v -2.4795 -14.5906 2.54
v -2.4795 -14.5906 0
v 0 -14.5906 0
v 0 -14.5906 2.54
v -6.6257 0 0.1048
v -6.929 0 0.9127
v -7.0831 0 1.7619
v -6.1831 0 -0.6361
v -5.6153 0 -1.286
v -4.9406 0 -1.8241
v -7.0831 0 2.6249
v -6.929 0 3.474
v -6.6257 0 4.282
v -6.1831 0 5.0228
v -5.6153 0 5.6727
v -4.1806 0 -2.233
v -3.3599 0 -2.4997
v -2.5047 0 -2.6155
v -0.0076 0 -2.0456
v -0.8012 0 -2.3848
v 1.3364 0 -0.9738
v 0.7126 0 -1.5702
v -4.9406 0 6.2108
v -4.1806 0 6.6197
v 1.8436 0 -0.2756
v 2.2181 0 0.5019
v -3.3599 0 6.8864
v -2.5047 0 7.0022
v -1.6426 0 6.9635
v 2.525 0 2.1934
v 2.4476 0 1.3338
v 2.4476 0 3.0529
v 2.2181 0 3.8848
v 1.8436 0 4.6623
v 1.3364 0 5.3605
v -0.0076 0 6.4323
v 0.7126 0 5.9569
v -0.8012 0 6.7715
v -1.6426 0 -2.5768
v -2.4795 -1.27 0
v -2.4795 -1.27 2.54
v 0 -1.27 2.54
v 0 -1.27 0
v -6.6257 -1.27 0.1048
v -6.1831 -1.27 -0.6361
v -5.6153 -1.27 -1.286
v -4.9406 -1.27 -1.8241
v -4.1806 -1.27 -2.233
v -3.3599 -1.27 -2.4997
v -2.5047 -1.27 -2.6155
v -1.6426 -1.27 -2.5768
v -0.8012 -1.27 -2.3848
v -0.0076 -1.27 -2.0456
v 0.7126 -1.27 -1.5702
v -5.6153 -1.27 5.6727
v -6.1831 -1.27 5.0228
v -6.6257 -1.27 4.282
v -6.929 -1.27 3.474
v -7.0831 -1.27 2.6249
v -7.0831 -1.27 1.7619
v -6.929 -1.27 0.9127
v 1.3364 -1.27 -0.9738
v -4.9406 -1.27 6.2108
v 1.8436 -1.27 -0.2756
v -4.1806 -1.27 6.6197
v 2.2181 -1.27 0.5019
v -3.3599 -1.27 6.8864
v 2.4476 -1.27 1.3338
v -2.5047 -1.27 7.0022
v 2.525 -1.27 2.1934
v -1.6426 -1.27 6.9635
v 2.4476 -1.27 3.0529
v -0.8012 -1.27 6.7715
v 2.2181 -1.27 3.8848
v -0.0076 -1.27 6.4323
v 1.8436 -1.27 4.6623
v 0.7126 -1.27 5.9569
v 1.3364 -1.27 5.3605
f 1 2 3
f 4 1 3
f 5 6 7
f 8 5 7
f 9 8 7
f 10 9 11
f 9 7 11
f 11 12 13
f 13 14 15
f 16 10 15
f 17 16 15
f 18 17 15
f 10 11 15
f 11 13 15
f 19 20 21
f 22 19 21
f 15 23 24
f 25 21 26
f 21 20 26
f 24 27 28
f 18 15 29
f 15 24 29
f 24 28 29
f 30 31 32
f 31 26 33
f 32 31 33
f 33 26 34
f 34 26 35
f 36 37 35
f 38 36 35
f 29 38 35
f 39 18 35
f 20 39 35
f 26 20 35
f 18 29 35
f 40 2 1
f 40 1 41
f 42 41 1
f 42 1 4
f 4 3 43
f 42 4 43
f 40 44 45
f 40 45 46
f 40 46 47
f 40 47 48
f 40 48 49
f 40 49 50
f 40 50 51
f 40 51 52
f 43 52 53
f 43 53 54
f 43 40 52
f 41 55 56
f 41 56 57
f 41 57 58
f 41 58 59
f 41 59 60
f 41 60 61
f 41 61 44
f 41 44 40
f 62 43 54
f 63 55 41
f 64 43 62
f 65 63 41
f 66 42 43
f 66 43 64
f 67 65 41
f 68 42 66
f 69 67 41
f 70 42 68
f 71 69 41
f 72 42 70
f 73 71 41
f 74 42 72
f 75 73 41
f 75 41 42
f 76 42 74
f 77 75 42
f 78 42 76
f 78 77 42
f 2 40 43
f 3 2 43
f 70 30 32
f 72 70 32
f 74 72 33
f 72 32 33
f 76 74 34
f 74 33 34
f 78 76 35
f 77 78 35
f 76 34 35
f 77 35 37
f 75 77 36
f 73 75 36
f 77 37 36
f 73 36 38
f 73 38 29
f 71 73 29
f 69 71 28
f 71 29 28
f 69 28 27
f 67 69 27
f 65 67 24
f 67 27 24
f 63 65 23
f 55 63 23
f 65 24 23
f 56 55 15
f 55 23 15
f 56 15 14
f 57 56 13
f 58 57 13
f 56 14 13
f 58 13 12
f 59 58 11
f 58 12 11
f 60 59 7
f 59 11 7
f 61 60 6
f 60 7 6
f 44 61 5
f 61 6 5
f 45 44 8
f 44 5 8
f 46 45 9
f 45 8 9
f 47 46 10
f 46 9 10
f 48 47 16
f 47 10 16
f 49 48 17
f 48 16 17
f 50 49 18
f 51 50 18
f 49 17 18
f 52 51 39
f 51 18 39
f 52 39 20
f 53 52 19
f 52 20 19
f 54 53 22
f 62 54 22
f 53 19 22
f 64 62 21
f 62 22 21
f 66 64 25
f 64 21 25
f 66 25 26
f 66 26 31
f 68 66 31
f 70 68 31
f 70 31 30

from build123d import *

# Parameters (mm, degrees)
F0_W     = 2.479451
F0_H     = 14.59062
F1_DEPTH = 2.54
F2_R     = 4.813733
F3_DEPTH = 1.27


with BuildPart() as f1:
    # F0 (on Top) → F1 (new body)
    with BuildSketch(Plane.XY):
        with Locations((-1.239726, -7.29531)):
            Rectangle(F0_W, F0_H)
    extrude(amount=F1_DEPTH)

    # F2 (on Front) → F3 (join)
    with BuildSketch(Plane.XZ):
        with Locations((-2.288725, 2.193361)):
            Circle(F2_R)
    extrude(amount=F3_DEPTH)


solid = f1.part
